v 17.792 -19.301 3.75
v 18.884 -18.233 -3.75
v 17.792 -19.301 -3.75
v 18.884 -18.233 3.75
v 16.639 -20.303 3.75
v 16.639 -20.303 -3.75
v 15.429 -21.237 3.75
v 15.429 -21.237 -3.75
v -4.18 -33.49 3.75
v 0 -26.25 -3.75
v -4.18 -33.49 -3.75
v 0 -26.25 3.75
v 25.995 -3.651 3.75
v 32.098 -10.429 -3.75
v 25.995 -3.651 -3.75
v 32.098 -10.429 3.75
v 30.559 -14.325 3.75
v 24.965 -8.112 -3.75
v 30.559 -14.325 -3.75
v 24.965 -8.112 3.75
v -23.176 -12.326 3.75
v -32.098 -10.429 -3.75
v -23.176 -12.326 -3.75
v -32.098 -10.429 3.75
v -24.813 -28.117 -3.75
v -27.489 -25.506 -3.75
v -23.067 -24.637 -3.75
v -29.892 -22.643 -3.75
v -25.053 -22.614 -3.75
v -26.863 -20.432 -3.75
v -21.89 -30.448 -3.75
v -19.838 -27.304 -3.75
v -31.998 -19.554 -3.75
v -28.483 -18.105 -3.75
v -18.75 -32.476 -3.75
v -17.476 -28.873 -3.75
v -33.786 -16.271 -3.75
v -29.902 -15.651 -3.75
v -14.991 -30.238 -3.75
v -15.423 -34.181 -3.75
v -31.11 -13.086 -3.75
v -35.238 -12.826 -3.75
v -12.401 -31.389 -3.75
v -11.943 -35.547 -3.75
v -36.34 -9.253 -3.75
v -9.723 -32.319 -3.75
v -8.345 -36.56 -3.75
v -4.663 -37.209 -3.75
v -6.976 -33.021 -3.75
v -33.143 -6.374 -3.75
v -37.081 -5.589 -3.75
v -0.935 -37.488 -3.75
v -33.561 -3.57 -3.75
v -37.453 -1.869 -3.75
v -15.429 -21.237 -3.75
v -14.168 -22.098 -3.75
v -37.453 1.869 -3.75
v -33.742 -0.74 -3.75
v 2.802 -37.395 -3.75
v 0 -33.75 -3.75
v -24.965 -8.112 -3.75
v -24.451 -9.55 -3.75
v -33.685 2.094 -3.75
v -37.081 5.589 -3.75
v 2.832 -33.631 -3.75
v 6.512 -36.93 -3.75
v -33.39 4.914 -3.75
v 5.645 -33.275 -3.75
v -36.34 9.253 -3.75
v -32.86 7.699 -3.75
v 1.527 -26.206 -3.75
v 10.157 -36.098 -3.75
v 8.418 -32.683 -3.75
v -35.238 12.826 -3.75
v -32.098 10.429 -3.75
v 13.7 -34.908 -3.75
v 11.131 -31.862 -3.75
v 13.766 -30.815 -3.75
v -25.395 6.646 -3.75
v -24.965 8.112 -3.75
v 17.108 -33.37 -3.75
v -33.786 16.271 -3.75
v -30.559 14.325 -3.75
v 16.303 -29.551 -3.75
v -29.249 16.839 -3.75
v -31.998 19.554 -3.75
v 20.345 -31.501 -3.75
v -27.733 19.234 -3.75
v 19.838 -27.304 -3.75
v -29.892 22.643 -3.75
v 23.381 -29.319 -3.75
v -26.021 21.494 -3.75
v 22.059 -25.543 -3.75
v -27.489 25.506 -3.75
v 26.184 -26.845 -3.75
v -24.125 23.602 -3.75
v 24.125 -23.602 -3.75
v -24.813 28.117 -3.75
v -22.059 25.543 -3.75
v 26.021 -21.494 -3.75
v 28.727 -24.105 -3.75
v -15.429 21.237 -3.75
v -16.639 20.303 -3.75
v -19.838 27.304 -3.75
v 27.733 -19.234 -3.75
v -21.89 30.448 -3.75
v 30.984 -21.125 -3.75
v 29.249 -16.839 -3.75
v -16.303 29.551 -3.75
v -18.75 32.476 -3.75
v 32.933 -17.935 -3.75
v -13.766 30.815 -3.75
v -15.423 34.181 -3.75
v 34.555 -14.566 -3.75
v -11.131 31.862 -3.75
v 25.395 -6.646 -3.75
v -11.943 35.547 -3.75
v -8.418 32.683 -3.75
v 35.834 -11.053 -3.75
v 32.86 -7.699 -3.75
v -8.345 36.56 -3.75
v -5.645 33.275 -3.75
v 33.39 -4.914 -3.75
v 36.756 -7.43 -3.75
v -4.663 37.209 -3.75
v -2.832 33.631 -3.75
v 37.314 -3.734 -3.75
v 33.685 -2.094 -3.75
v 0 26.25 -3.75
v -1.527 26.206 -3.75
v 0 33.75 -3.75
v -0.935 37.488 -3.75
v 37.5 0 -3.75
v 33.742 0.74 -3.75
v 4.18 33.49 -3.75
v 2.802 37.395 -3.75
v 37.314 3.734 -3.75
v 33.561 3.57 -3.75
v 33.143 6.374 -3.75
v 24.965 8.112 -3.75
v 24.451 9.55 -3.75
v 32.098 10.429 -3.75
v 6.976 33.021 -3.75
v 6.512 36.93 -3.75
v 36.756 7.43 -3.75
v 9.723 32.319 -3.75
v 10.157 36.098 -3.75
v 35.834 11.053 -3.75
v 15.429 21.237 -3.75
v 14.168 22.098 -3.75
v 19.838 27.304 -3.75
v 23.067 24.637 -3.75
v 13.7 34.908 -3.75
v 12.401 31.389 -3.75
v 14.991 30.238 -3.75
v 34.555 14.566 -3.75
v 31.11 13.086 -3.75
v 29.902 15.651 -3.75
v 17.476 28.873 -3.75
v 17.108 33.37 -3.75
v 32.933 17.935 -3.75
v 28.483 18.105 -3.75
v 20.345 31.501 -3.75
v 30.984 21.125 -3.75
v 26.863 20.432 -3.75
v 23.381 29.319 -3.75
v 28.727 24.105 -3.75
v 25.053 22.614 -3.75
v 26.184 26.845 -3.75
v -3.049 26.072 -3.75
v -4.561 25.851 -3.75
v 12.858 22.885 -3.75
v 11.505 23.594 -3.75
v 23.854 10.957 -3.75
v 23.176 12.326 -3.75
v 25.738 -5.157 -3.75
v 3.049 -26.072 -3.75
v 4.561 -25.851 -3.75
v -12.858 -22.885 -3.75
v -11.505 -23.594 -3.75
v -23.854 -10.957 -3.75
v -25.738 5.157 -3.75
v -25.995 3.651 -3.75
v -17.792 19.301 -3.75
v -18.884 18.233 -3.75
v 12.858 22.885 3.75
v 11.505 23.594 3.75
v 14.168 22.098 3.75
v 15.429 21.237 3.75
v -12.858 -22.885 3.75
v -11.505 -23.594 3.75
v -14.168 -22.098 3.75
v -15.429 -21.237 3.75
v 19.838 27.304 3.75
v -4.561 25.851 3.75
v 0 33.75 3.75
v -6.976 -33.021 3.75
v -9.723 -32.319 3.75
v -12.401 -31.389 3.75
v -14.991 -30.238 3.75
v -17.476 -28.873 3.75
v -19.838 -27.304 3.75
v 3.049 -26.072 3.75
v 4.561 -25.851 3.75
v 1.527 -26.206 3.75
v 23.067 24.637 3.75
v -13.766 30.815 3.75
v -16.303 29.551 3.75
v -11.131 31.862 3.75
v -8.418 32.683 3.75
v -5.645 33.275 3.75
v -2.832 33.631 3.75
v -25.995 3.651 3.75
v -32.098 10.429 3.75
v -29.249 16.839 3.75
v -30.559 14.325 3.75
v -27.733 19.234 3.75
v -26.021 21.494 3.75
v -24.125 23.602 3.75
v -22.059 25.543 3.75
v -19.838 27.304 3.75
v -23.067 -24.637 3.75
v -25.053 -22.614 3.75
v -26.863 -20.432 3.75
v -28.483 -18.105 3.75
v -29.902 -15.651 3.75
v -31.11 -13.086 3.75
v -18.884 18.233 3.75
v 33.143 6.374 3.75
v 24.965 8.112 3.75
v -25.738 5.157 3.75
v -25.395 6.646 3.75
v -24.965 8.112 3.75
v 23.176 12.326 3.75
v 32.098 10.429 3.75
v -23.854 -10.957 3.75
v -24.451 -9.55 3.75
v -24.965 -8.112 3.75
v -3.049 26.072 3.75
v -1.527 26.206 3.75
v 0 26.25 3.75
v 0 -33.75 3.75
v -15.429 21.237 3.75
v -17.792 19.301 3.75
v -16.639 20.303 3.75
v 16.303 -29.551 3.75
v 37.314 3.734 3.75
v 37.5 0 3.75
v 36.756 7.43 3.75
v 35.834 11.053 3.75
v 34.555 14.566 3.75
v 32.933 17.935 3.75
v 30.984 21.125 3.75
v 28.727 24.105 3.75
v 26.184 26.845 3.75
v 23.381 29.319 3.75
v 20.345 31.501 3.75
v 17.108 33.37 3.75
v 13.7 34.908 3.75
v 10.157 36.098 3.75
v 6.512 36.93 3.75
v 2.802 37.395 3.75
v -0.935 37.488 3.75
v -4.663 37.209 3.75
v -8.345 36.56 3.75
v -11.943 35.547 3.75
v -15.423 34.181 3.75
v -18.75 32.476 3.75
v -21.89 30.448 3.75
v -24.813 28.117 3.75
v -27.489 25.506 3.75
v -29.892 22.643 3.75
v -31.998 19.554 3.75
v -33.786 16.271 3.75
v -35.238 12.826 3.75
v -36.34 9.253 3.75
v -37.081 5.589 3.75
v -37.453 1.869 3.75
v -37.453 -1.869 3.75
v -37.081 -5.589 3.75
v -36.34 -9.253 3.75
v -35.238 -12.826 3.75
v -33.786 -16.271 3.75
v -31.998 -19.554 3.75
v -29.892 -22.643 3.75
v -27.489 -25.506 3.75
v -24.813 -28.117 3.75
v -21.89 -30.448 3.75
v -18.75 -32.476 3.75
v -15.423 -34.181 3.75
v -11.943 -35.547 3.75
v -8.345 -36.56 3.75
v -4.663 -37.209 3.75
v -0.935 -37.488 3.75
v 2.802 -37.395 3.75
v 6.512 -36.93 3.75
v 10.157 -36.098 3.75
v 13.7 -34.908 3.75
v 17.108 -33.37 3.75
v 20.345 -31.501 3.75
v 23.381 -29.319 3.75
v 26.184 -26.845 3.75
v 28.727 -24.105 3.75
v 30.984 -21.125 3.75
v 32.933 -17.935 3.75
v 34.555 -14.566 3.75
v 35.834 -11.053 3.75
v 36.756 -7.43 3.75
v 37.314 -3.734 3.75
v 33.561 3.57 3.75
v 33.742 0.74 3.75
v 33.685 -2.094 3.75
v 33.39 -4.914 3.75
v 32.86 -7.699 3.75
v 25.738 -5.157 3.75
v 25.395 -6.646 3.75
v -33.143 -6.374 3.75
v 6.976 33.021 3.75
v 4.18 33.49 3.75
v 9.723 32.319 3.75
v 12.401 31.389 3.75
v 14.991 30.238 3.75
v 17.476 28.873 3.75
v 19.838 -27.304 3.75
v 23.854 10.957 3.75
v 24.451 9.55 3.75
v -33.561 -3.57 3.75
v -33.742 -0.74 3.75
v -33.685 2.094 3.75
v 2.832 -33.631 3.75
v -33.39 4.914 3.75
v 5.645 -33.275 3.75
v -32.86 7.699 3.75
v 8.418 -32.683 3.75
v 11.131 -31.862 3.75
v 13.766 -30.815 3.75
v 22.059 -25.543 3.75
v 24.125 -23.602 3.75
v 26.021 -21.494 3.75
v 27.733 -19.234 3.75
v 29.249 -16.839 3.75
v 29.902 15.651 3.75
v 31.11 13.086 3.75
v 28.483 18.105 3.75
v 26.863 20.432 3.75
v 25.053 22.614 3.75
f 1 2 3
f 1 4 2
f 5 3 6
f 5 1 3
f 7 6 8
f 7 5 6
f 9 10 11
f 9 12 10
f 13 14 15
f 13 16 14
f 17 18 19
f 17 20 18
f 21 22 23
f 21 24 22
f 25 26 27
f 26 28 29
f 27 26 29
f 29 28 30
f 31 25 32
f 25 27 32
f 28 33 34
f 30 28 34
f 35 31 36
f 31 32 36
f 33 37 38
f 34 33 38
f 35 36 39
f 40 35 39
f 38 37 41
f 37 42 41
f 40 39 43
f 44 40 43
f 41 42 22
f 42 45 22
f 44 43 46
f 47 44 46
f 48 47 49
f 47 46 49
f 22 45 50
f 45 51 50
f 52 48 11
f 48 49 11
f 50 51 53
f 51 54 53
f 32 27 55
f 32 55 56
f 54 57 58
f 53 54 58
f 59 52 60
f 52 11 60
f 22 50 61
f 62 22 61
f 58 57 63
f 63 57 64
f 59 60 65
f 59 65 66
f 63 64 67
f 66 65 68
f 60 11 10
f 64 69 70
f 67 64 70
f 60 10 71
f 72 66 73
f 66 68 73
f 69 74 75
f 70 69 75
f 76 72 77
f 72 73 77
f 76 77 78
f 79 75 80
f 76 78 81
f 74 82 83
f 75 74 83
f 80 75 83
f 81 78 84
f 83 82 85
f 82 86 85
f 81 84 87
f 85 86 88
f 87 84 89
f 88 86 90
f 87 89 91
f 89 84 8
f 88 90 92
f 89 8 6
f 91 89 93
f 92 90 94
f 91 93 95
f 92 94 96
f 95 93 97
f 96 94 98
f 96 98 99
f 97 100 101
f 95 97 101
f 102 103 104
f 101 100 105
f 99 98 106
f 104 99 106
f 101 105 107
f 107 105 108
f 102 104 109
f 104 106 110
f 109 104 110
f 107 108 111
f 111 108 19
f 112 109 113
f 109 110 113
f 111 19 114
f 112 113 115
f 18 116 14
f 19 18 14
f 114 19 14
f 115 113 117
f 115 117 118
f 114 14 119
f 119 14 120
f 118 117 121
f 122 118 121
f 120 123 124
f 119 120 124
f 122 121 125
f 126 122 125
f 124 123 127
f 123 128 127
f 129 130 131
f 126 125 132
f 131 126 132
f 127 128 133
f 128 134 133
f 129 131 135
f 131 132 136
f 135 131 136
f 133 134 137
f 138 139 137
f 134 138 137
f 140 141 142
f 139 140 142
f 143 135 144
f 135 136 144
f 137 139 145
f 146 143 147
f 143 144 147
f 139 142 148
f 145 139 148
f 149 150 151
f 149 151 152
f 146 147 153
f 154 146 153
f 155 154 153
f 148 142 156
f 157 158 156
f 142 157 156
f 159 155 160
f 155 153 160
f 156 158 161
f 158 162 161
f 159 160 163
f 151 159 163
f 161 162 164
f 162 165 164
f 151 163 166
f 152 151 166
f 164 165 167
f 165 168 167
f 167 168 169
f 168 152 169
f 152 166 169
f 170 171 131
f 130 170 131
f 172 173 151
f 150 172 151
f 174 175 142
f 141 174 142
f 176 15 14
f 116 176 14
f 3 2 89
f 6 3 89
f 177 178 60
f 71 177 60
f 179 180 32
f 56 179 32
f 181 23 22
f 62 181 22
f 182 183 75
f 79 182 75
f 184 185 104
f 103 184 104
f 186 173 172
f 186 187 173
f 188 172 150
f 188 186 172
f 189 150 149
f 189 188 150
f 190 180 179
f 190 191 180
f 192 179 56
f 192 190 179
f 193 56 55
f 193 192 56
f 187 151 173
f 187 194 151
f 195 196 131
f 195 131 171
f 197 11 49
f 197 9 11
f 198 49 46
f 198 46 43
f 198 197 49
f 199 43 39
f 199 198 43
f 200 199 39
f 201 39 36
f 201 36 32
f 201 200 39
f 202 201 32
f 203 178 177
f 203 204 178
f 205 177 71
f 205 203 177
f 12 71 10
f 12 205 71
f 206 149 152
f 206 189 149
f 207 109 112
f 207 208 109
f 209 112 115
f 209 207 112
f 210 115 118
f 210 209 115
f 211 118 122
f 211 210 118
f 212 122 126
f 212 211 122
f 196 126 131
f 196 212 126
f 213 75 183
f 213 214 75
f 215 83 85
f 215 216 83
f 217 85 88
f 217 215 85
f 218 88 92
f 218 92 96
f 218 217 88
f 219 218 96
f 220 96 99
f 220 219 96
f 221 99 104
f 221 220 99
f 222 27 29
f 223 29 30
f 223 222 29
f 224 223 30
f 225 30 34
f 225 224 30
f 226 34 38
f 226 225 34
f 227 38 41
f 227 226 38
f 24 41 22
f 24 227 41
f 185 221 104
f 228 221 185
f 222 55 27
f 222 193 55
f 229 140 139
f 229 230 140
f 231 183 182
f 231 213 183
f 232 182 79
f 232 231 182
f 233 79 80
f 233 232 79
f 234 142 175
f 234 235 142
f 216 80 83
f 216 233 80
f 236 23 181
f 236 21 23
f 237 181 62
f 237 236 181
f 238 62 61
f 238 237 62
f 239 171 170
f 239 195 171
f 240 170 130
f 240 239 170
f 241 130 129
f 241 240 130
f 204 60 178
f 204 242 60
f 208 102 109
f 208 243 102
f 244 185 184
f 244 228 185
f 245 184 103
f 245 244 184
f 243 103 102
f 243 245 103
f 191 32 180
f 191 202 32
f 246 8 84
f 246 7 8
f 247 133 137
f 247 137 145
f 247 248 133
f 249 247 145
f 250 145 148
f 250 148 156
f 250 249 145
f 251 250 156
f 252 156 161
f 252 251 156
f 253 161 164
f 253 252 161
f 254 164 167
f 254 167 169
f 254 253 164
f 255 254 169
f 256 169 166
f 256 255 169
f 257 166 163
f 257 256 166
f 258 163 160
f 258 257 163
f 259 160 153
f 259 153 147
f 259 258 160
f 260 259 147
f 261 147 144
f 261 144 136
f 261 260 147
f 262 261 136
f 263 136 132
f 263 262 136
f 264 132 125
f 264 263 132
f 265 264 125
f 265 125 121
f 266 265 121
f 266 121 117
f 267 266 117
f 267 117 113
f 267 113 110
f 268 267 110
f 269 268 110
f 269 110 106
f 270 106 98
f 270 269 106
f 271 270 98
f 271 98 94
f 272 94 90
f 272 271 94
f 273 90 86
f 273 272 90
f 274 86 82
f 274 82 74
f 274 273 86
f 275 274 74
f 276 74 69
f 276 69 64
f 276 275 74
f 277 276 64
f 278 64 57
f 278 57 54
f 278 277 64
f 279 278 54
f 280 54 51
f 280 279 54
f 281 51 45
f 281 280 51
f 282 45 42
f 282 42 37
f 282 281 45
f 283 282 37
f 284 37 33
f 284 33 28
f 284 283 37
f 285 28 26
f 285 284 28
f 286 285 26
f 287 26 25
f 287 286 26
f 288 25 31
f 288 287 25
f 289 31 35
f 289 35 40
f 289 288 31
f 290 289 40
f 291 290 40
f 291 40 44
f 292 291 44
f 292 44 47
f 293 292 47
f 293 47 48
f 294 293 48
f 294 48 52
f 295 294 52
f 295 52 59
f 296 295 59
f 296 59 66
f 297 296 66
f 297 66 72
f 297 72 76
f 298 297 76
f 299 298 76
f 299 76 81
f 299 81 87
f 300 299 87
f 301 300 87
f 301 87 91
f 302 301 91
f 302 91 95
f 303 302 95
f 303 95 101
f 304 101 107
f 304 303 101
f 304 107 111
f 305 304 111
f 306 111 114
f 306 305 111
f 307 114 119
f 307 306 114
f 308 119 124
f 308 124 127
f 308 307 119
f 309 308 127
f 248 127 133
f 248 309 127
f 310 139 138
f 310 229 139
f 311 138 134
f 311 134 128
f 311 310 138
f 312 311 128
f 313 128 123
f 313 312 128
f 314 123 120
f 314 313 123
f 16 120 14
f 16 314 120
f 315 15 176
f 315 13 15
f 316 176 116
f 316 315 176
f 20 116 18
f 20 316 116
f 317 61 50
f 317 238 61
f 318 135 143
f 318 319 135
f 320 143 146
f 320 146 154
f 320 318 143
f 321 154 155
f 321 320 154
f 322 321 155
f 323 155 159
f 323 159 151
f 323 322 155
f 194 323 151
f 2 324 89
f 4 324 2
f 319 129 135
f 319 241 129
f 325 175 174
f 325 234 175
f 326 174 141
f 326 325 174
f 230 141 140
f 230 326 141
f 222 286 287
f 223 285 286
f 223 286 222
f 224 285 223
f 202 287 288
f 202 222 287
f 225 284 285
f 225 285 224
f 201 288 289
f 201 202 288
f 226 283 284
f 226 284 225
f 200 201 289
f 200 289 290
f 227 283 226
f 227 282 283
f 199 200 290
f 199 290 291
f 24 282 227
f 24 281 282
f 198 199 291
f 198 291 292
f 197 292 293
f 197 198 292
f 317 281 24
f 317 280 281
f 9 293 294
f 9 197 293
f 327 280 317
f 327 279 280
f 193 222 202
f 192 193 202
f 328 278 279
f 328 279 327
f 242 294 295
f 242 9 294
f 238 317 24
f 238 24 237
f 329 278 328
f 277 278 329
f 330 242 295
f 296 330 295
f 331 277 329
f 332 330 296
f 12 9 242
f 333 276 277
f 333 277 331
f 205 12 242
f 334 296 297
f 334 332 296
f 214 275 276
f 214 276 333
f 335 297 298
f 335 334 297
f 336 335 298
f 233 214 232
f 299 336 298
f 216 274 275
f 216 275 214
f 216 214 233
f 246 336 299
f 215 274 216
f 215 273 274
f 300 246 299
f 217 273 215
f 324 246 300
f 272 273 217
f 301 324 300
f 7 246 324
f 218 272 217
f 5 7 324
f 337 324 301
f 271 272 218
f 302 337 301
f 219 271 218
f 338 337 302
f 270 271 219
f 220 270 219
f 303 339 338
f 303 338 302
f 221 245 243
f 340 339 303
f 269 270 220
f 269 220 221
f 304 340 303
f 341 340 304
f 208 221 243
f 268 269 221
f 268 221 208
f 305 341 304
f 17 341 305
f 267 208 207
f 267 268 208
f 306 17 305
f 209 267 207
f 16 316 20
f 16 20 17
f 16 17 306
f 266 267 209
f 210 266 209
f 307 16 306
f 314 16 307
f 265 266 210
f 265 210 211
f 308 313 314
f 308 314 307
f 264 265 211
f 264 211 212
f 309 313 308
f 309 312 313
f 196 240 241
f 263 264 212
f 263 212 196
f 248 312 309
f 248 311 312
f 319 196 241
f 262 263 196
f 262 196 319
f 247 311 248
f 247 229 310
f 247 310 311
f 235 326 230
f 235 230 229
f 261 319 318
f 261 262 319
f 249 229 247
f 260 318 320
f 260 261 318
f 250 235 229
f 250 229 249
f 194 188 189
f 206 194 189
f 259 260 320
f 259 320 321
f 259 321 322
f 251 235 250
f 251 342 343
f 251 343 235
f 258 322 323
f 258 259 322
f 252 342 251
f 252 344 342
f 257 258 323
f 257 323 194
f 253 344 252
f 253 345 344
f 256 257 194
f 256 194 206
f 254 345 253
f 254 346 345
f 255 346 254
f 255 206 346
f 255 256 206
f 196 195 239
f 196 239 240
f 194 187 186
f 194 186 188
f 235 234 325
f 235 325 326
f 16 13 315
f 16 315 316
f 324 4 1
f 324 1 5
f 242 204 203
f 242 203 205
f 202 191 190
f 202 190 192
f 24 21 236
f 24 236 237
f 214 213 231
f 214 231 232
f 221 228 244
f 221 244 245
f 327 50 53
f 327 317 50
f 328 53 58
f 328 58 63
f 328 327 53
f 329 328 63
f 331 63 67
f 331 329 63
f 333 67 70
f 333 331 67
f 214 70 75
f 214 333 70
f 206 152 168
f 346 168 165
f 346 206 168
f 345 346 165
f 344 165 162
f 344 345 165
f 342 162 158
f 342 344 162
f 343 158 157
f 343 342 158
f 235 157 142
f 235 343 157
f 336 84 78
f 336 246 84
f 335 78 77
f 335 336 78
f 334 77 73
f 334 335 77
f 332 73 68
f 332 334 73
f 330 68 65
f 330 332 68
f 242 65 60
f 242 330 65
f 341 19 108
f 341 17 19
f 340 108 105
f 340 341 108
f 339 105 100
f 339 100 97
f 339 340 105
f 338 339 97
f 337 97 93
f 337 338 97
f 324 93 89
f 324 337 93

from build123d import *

# Parameters (mm, degrees)
SKETCH1_R           = 25
BOSS_EXTRUDE2_DEPTH = 2.5
SCALE1_SCALE        = 1.5


with BuildPart() as part:
    # Sketch1 → Boss-Extrude2 (new, symmetric)
    with BuildSketch(Plane.XY):
        Circle(SKETCH1_R)
        with BuildLine():
            Line((0, 22.5), (-3.040407483, 17.233859763))
            ThreePointArc((-3.040407483, 17.233859763), (-1.526016734, 17.433337974), (0, 17.5))
            Line((0, 17.5), (2.786730187, 22.32675827))
            ThreePointArc((2.786730187, 22.32675827), (8.267212977, 20.926136519), (13.225168177, 18.202882373))
            Line((13.225168177, 18.202882373), (7.670067285, 15.729592107))
            ThreePointArc((7.670067285, 15.729592107), (9.012485488, 15.000836821), (10.286241915, 14.157797402))
            Line((10.286241915, 14.157797402), (15.377851323, 16.424727964))
            ThreePointArc((15.377851323, 16.424727964), (18.988390227, 12.070254205), (21.398771617, 6.952882373))
            Line((21.398771617, 6.952882373), (15.450837046, 8.217154895))
            ThreePointArc((15.450837046, 8.217154895), (16.108524577, 6.838525862), (16.643489035, 5.407797402))
            Line((16.643489035, 5.407797402), (22.095155927, 4.249009832))
            ThreePointArc((22.095155927, 4.249009832), (22.456647803, -1.396054962), (21.398771617, -6.952882373))
            Line((21.398771617, -6.952882373), (17.329912211, -2.433956196))
            ThreePointArc((17.329912211, -2.433956196), (17.051654786, -3.935869544), (16.643489035, -5.407797402))
            Line((16.643489035, -5.407797402), (20.372861954, -9.549685638))
            ThreePointArc((20.372861954, -9.549685638), (17.347229191, -14.329118584), (13.225168177, -18.202882373))
            Line((13.225168177, -18.202882373), (12.589549933, -12.155378747))
            ThreePointArc((12.589549933, -12.155378747), (11.481632431, -13.206896559), (10.286241915, -14.157797402))
            Line((10.286241915, -14.157797402), (10.868827163, -19.700725776))
            ThreePointArc((10.868827163, -19.700725776), (5.611758639, -21.788945935), (0, -22.5))
            Line((0, -22.5), (3.040407483, -17.233859763))
            ThreePointArc((3.040407483, -17.233859763), (1.526016734, -17.433337974), (0, -17.5))
            Line((0, -17.5), (-2.786730187, -22.32675827))
            ThreePointArc((-2.786730187, -22.32675827), (-8.267212977, -20.926136519), (-13.225168177, -18.202882373))
            Line((-13.225168177, -18.202882373), (-7.670067285, -15.729592107))
            ThreePointArc((-7.670067285, -15.729592107), (-9.012485488, -15.000836821), (-10.286241915, -14.157797402))
            Line((-10.286241915, -14.157797402), (-15.377851323, -16.424727964))
            ThreePointArc((-15.377851323, -16.424727964), (-18.988390227, -12.070254205), (-21.398771617, -6.952882373))
            Line((-21.398771617, -6.952882373), (-15.450837046, -8.217154895))
            ThreePointArc((-15.450837046, -8.217154895), (-16.108524577, -6.838525862), (-16.643489035, -5.407797402))
            Line((-16.643489035, -5.407797402), (-22.095155927, -4.249009832))
            ThreePointArc((-22.095155927, -4.249009832), (-22.456647803, 1.396054962), (-21.398771617, 6.952882373))
            Line((-21.398771617, 6.952882373), (-17.329912211, 2.433956196))
            ThreePointArc((-17.329912211, 2.433956196), (-17.051654786, 3.935869544), (-16.643489035, 5.407797402))
            Line((-16.643489035, 5.407797402), (-20.372861954, 9.549685638))
            ThreePointArc((-20.372861954, 9.549685638), (-17.347229191, 14.329118584), (-13.225168177, 18.202882373))
            Line((-13.225168177, 18.202882373), (-12.589549933, 12.155378747))
            ThreePointArc((-12.589549933, 12.155378747), (-11.481632431, 13.206896559), (-10.286241915, 14.157797402))
            Line((-10.286241915, 14.157797402), (-10.868827163, 19.700725776))
            ThreePointArc((-10.868827163, 19.700725776), (-5.611758639, 21.788945935), (0, 22.5))
        make_face(mode=Mode.SUBTRACT)
    extrude(amount=BOSS_EXTRUDE2_DEPTH, both=True)


with BuildPart() as part_1:
    # Scale1: scaled about (0, 0, 0)
    add(part.part.scale(SCALE1_SCALE))


solid = part_1.part
